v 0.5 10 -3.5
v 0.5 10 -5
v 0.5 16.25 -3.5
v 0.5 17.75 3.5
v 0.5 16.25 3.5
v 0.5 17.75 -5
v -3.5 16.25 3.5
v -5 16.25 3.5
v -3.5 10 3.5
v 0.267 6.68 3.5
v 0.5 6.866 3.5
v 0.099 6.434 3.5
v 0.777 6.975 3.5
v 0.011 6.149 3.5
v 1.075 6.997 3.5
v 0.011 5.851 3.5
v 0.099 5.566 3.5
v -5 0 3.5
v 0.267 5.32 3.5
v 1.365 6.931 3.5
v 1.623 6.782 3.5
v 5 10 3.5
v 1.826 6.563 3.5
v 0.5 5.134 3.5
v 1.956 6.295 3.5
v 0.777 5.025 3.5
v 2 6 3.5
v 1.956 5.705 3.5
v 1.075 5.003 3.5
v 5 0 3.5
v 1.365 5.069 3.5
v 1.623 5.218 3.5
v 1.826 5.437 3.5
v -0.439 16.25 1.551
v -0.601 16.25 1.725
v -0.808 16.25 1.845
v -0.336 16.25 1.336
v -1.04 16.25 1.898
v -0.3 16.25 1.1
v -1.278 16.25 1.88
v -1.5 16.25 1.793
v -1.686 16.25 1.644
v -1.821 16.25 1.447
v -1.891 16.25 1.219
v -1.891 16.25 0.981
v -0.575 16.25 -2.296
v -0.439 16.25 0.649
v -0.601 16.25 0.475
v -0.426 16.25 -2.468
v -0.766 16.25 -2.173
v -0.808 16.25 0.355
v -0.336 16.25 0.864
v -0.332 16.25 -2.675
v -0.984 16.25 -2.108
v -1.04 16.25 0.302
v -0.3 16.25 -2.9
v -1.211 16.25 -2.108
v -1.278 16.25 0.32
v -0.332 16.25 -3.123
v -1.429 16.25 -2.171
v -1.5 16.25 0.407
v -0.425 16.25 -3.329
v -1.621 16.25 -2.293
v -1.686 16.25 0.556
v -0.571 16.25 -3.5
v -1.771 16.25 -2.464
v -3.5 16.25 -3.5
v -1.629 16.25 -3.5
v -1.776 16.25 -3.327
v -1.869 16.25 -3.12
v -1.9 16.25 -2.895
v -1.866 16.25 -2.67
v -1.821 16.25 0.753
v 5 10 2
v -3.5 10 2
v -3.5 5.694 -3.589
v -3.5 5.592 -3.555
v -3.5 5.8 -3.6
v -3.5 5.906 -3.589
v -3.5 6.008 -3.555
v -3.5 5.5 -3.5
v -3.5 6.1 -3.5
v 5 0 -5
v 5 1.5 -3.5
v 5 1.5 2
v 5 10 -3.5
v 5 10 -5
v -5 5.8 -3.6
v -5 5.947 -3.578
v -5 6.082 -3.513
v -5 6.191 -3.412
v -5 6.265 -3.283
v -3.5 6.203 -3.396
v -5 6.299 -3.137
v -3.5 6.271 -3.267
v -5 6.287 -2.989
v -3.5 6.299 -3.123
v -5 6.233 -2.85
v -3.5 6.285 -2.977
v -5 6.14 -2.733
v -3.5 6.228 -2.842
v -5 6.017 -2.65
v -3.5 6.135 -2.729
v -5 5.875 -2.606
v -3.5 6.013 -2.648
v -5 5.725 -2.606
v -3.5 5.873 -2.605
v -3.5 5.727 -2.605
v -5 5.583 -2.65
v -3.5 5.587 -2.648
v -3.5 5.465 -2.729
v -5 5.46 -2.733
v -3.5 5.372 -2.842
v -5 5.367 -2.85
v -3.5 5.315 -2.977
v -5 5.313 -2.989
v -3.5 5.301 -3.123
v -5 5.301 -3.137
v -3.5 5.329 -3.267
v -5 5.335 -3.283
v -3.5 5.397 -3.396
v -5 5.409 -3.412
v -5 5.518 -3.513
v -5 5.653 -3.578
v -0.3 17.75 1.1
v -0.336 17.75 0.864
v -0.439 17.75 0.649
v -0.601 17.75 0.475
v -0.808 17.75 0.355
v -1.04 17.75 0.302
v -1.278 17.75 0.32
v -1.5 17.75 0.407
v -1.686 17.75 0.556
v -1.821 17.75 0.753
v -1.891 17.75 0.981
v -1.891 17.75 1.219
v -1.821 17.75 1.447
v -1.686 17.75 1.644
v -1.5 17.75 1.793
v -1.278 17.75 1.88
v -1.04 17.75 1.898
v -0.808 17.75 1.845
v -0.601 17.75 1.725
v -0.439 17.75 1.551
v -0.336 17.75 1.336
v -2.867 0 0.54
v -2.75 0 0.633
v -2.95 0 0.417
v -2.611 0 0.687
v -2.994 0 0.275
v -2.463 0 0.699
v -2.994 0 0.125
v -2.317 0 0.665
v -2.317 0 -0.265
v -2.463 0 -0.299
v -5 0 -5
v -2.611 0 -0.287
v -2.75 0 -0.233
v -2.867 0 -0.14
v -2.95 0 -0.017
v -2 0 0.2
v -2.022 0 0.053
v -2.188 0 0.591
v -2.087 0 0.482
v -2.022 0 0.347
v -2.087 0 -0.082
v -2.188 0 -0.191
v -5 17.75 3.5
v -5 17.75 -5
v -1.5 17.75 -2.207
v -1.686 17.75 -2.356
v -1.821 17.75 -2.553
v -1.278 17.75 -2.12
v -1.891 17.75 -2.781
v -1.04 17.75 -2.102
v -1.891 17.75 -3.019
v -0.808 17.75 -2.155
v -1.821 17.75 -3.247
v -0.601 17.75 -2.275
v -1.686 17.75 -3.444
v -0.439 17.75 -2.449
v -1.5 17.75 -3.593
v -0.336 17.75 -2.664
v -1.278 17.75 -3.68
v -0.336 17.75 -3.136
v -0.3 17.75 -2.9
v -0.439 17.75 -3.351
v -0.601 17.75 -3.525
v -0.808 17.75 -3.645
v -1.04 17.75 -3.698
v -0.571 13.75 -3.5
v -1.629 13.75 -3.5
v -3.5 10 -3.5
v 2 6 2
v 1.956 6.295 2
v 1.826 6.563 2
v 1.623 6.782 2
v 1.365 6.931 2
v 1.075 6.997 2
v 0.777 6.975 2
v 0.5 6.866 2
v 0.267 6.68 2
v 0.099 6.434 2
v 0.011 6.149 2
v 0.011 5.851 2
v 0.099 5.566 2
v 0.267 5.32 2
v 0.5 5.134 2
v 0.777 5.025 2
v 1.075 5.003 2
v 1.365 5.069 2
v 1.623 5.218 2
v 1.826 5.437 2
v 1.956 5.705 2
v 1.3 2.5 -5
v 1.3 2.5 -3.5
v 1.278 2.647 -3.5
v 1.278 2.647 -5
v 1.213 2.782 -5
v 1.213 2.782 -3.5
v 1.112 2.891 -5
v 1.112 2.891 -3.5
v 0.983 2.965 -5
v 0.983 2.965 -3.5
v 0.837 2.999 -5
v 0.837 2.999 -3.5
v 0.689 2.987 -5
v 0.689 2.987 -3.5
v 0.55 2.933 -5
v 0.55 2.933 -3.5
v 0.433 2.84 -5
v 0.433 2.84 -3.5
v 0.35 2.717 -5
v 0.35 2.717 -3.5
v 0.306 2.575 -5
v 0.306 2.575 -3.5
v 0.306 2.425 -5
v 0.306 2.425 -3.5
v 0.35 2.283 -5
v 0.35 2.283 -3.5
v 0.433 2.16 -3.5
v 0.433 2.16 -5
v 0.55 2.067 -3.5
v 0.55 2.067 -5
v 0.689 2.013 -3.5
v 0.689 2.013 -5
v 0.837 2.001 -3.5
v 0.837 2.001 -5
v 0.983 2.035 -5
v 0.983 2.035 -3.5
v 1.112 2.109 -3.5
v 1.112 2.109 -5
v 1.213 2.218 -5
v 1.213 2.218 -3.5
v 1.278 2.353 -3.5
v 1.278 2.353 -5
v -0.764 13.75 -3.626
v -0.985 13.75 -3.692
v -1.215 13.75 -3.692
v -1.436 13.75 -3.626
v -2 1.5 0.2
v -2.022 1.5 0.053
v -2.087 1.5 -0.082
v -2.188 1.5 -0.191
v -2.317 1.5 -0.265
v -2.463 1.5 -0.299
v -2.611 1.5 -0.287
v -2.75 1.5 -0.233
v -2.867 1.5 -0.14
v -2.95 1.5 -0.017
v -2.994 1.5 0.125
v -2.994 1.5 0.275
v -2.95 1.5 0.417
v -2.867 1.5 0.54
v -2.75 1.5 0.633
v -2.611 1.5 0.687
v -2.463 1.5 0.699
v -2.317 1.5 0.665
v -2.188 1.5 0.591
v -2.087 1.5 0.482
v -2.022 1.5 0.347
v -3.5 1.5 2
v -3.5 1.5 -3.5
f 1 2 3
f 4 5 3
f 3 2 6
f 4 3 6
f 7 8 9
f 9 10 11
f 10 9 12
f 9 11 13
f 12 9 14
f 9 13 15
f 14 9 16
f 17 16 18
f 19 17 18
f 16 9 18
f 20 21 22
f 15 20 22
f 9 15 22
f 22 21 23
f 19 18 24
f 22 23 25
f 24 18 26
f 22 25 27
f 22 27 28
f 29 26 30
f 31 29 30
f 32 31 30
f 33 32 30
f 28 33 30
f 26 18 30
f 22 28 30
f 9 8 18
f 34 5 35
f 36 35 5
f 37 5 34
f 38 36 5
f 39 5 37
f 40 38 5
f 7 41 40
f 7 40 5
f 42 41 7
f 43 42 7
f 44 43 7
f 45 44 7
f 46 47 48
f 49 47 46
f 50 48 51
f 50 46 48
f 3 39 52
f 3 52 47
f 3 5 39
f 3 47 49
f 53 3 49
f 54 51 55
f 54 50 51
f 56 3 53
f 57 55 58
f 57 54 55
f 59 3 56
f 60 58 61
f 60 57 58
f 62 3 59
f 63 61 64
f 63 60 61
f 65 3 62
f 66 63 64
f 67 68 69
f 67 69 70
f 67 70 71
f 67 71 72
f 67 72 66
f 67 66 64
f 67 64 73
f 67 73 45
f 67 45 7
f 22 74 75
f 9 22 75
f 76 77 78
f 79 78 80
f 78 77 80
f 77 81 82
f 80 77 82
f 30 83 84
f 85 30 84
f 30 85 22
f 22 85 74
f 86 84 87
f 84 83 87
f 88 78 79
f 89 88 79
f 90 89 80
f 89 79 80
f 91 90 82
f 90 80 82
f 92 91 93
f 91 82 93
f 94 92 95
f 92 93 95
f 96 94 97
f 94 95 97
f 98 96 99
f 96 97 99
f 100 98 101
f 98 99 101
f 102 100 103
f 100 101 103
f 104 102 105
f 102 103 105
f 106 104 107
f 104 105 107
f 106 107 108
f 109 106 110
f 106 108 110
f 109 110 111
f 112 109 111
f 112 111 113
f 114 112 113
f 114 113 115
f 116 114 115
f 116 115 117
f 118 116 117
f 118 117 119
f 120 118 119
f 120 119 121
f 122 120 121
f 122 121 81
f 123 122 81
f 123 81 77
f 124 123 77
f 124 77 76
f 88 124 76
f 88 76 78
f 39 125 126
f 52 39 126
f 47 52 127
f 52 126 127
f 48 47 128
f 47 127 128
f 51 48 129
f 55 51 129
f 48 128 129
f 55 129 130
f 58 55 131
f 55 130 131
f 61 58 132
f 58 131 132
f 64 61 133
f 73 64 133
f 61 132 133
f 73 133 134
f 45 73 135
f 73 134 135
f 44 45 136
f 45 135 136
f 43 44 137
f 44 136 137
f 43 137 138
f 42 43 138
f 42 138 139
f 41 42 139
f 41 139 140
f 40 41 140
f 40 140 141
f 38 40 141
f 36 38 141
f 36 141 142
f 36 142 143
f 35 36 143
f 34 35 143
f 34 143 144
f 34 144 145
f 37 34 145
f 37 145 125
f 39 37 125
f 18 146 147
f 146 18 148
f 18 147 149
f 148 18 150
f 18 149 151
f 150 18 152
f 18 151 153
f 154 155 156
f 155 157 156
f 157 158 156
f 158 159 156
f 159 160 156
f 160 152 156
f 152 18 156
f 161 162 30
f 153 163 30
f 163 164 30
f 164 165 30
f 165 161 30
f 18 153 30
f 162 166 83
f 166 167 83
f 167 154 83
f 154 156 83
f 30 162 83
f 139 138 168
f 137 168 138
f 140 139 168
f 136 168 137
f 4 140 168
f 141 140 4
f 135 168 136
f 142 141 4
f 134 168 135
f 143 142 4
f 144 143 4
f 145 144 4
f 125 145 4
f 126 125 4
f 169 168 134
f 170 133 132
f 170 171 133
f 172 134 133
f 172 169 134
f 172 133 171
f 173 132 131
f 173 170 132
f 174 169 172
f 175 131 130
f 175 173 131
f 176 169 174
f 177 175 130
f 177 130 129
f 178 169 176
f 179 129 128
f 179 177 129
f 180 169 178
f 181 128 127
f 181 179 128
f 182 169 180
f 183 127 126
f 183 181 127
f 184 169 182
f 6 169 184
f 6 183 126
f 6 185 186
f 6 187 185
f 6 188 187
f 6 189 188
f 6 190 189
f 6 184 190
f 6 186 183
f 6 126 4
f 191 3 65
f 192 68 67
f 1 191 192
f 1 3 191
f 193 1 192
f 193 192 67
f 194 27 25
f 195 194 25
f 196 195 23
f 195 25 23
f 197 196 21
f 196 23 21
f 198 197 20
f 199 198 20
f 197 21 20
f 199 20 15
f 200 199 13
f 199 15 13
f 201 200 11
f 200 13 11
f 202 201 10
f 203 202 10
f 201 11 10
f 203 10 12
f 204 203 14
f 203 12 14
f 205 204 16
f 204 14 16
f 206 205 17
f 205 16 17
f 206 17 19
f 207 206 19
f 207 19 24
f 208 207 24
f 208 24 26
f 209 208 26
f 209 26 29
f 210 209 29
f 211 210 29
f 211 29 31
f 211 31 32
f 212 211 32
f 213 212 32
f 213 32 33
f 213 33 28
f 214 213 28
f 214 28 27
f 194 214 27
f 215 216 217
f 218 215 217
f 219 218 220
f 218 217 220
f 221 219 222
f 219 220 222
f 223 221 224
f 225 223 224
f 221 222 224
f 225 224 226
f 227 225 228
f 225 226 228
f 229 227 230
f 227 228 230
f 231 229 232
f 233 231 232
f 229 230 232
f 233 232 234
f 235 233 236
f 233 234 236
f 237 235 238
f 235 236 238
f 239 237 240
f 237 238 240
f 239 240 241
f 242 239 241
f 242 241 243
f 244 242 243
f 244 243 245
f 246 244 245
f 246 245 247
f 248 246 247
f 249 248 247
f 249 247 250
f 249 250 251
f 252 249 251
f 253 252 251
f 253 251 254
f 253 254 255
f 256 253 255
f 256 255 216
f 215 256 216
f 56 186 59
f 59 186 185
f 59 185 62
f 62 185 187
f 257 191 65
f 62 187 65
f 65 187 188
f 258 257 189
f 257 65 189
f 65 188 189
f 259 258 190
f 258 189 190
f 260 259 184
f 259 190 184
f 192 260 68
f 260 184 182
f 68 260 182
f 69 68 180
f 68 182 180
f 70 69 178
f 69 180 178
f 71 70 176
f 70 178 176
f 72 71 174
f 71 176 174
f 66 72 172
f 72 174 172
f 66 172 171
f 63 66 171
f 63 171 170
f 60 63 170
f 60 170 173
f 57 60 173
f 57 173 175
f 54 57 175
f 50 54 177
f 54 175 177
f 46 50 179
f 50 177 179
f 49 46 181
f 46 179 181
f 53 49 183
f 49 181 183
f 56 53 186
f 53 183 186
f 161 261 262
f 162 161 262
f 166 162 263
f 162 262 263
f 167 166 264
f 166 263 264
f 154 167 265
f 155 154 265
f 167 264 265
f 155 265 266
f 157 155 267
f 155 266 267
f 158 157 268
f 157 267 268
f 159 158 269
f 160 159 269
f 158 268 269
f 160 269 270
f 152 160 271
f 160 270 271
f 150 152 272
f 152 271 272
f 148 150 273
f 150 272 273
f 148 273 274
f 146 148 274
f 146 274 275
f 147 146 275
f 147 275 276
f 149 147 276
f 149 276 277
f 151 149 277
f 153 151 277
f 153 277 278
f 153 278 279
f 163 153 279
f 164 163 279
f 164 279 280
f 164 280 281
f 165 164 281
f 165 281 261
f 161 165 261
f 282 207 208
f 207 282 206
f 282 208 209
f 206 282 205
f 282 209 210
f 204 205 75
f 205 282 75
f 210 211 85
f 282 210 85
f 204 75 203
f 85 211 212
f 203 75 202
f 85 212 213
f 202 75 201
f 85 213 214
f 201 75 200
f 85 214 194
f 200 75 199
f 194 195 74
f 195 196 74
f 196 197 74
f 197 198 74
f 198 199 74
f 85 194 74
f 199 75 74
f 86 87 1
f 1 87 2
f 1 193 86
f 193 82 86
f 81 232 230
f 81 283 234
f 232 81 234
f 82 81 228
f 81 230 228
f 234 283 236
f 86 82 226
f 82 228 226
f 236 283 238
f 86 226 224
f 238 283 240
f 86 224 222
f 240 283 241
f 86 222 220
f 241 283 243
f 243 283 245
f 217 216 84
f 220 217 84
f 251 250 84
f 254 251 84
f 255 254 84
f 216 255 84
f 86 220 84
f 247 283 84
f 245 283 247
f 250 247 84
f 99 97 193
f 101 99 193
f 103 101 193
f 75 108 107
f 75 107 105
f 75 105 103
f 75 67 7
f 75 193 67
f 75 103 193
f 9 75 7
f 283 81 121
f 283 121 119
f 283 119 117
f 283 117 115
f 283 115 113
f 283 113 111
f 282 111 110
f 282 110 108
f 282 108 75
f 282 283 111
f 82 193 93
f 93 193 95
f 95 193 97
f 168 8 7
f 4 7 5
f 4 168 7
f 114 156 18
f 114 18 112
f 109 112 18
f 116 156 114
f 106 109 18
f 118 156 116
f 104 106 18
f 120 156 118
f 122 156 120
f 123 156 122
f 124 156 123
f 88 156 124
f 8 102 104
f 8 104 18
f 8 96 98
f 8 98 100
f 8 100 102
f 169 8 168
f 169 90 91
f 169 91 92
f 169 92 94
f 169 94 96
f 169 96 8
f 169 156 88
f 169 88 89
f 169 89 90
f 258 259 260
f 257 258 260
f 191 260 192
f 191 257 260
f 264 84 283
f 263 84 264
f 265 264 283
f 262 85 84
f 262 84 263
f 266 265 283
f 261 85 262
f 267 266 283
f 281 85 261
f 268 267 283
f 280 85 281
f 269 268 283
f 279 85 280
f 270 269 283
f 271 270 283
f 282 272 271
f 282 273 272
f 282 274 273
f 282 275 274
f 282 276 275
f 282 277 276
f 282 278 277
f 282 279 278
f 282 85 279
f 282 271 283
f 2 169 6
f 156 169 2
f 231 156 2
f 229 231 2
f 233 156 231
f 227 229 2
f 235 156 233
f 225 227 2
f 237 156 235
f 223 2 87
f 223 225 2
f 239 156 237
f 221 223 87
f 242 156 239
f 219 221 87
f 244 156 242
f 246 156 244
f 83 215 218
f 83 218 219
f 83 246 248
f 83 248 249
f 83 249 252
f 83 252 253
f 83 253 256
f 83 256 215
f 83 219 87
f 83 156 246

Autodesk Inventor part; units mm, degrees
ref_plane "YZ Plane" through (0, 0, 0) normal (1, 0, 0) x (0, 1, 0)
ref_plane "XZ Plane" through (0, 0, 0) normal (0, 1, 0) x (-1, 0, 0)
ref_plane "XY Plane" through (0, 0, 0) normal (0, 0, 1) x (1, 0, 0)
sketch "Sketch1" plane through (0, 0, 0) normal (0, 1, 0) x (-1, 0, 0)
  line L0 (-5, 5) -> (5, 5)
  line L1 (5, 5) -> (5, -5)
  line L2 (5, -5) -> (-5, -5)
  line L3 (-5, -5) -> (-5, 5)
  line L4 (-5, 5) -> (5, -5) construction
  line L5 (5, 5) -> (-5, -5) construction
  point P0 (0, 0)
  dimension "d0" = 10
  dimension "d1" = 10
extrude "Extrusion1" add sketch "Sketch1" along normal blind 1.5
sketch "Sketch2" plane through (0, 1.5, 0) normal (0, 1, 0) x (1, 0, 0)
  line L0 (-5, -5) -> (-3.5, -5)
  line L1 (-5, -5) -> (5, -5) projected
  line L2 (-3.5, -5) -> (-3.5, 3.5)
  line L3 (-3.5, 3.5) -> (5, 3.5)
  line L4 (5, 3.5) -> (5, 5)
  line L5 (5, 5) -> (-5, 5)
  line L6 (-5, 5) -> (-5, -5)
  point P0 (0, 0)
  dimension "d4" = 1.5
  dimension "d5" = 8.5
  dimension "d6" = 90
  dimension "d7" = 8.5
  dimension "d8" = 90
  dimension "d9" = 10
  dimension "d10" = 90
extrude "Extrusion2" add sketch "Sketch2" along normal blind 8.5
sketch "Sketch3" plane through (0, 1.5, 0) normal (0, 1, 0) x (1, 0, 0)
  circle A0 centre (-2.5, -0.2) radius 0.5
  line L0 (5, 3.5) -> (-3.5, 3.5) projected
  line L1 (-3.5, 3.5) -> (-3.5, -5) projected
  point P0 (0, 0)
  dimension "d13" = 1
  dimension "d14" = 3.7
  dimension "d15" = 1
extrude "Extrusion3" cut sketch "Sketch3" against normal blind 8.5
sketch "Sketch4" plane through (-3.5, 1.5, -3.5) normal (0, 0, 1) x (1, 0, 0)
  circle A0 centre (4.3, 1) radius 0.5
  line L0 (8.5, 0) -> (0, 0) projected
  line L1 (0, 0) -> (0, 8.5) projected
  point P0 (3.5, -1.5)
  dimension "d18" = 1
  dimension "d19" = 1
  dimension "d20" = 4.3
extrude "Extrusion4" cut sketch "Sketch4" against normal blind 8.5
sketch "Sketch5" plane through (0, 0, 0) normal (0, -1, 0) x (1, 0, 0)
  circle A0 centre (-2.5, 0.2) radius 0.5
  circle A1 centre (-2.5, 0.2) radius 0.5 projected
  point P0 (0, 0)
  dimension "d23" = 1
  dimension "d24" = 0
extrude "Extrusion5" cut sketch "Sketch5" against normal blind 10
sketch "Sketch6" plane through (-3.5, 1.5, 5) normal (1, 0, 0) x (0, 0, -1)
  circle A0 centre (8.1, 4.3) radius 0.5
  line L0 (0, 0) -> (8.5, 0) projected
  line L1 (8.5, 0) -> (8.5, 8.5) projected
  point P0 (5, -1.5)
  dimension "d27" = 1
  dimension "d28" = 4.3
  dimension "d29" = 0.4
extrude "Extrusion6" cut sketch "Sketch6" against normal blind 2
sketch "Sketch7" plane through (-5, 0, 5) normal (0, 0, 1) x (1, 0, 0)
  line L0 (0, 0) -> (10, 0)
  line L1 (10, 0) -> (10, 10)
  line L2 (10, 10) -> (0, 10)
  line L3 (0, 10) -> (0, 0)
  point P0 (5, 0)
extrude "Extrusion7" cut sketch "Sketch7" against normal blind 3
sketch "Sketch8" plane through (-5, 0, 2) normal (0, 0, 1) x (1, 0, 0)
  line L0 (0, 0) -> (10, 0)
  line L1 (10, 0) -> (10, 10)
  line L2 (10, 10) -> (0, 10)
  line L3 (0, 10) -> (0, 0)
  point P0 (5, 0)
extrude "Extrusion8" add sketch "Sketch8" along normal blind 1.5
sketch "Sketch9" plane through (-5, 0, 3.5) normal (0, 0, 1) x (1, 0, 0)
  circle A0 centre (6, 6) radius 1
  line L0 (0, 0) -> (10, 0) projected
  line L1 (0, 10) -> (0, 0) projected
  point P0 (5, 0)
  dimension "d36" = 2
  dimension "d37" = 6
  dimension "d38" = 6
extrude "Extrusion9" cut sketch "Sketch9" against normal blind 1.5
sketch "Sketch11" plane through (0, 10, 0) normal (0, 1, 0) x (1, 0, 0)
  line L0 (-5, 5) -> (-5, -3.5)
  line L1 (-5, -3.5) -> (-3.5, -3.5)
  line L2 (5, -3.5) -> (-5, -3.5) projected
  line L3 (-3.5, 3.5001) -> (-3.5, -3.5)
  line L4 (-5, 5) -> (0.5, 5)
  line L5 (5, 5) -> (-5, 5) projected
  line L6 (0.5, 5) -> (0.5, 3.5001)
  line L7 (0.5, 3.5001) -> (-3.5, 3.5001)
  point P0 (0, 0)
  dimension "d44" = 1.5
  dimension "d45" = 5.5
extrude "Extrusion10" add sketch "Sketch11" along normal blind 6.25
sketch "Sketch12" plane through (0, 16.25, 0) normal (0, 1, 0) x (1, 0, 0)
  line L0 (0.5, 3.5001) -> (-5, 3.5001)
  line L1 (-5, 3.5001) -> (-5, 5)
  line L2 (-5, 5) -> (0.5, 5)
  line L3 (0.5, 5) -> (0.5, 3.5001)
  point P0 (0, 0)
extrude "Extrusion11" add sketch "Sketch12" along normal blind 1.5
sketch "Sketch13" plane through (-3.5, 10, -3.5001) normal (0, 0, 1) x (1, 0, 0)
  line L0 (4, 0) -> (4, 7.75) projected
  line L1 (-1.5, 7.75) -> (4, 7.75)
  line L2 (4, 7.75) -> (4, 6.25)
  line L3 (4, 6.25) -> (-1.5, 6.25)
  line L4 (-1.5, 6.25) -> (-1.5, 7.75)
  point P0 (3.5, -10)
  dimension "d50" = 1.5
extrude "Extrusion12" add sketch "Sketch13" along normal blind 7
sketch "Sketch14" plane through (0, 17.75, 0) normal (0, 1, 0) x (1, 0, 0)
  circle A0 centre (-1.1, -1.1) radius 0.8
  line L0 (-5, 5) -> (-5, -3.4999) projected
  line L1 (0.5, 5) -> (-5, 5) projected
  point P0 (0, 0)
  dimension "d53" = 1.6
  dimension "d54" = 3.9
  dimension "d55" = 6.1
extrude "Extrusion13" cut sketch "Sketch14" against normal blind 2
sketch "Sketch15" plane through (0, 17.75, 0) normal (0, 1, 0) x (1, 0, 0)
  circle A0 centre (-1.1, 2.9) radius 0.8
  line L0 (-5, 5) -> (-5, -3.4999) projected
  line L1 (0.5, 5) -> (-5, 5) projected
  point P0 (0, 0)
  dimension "d58" = 1.6
  dimension "d59" = 3.9
  dimension "d60" = 2.1
extrude "Extrusion14" cut sketch "Sketch15" against normal blind 4
properties part number "Corner2" material "Aluminium 7075"
